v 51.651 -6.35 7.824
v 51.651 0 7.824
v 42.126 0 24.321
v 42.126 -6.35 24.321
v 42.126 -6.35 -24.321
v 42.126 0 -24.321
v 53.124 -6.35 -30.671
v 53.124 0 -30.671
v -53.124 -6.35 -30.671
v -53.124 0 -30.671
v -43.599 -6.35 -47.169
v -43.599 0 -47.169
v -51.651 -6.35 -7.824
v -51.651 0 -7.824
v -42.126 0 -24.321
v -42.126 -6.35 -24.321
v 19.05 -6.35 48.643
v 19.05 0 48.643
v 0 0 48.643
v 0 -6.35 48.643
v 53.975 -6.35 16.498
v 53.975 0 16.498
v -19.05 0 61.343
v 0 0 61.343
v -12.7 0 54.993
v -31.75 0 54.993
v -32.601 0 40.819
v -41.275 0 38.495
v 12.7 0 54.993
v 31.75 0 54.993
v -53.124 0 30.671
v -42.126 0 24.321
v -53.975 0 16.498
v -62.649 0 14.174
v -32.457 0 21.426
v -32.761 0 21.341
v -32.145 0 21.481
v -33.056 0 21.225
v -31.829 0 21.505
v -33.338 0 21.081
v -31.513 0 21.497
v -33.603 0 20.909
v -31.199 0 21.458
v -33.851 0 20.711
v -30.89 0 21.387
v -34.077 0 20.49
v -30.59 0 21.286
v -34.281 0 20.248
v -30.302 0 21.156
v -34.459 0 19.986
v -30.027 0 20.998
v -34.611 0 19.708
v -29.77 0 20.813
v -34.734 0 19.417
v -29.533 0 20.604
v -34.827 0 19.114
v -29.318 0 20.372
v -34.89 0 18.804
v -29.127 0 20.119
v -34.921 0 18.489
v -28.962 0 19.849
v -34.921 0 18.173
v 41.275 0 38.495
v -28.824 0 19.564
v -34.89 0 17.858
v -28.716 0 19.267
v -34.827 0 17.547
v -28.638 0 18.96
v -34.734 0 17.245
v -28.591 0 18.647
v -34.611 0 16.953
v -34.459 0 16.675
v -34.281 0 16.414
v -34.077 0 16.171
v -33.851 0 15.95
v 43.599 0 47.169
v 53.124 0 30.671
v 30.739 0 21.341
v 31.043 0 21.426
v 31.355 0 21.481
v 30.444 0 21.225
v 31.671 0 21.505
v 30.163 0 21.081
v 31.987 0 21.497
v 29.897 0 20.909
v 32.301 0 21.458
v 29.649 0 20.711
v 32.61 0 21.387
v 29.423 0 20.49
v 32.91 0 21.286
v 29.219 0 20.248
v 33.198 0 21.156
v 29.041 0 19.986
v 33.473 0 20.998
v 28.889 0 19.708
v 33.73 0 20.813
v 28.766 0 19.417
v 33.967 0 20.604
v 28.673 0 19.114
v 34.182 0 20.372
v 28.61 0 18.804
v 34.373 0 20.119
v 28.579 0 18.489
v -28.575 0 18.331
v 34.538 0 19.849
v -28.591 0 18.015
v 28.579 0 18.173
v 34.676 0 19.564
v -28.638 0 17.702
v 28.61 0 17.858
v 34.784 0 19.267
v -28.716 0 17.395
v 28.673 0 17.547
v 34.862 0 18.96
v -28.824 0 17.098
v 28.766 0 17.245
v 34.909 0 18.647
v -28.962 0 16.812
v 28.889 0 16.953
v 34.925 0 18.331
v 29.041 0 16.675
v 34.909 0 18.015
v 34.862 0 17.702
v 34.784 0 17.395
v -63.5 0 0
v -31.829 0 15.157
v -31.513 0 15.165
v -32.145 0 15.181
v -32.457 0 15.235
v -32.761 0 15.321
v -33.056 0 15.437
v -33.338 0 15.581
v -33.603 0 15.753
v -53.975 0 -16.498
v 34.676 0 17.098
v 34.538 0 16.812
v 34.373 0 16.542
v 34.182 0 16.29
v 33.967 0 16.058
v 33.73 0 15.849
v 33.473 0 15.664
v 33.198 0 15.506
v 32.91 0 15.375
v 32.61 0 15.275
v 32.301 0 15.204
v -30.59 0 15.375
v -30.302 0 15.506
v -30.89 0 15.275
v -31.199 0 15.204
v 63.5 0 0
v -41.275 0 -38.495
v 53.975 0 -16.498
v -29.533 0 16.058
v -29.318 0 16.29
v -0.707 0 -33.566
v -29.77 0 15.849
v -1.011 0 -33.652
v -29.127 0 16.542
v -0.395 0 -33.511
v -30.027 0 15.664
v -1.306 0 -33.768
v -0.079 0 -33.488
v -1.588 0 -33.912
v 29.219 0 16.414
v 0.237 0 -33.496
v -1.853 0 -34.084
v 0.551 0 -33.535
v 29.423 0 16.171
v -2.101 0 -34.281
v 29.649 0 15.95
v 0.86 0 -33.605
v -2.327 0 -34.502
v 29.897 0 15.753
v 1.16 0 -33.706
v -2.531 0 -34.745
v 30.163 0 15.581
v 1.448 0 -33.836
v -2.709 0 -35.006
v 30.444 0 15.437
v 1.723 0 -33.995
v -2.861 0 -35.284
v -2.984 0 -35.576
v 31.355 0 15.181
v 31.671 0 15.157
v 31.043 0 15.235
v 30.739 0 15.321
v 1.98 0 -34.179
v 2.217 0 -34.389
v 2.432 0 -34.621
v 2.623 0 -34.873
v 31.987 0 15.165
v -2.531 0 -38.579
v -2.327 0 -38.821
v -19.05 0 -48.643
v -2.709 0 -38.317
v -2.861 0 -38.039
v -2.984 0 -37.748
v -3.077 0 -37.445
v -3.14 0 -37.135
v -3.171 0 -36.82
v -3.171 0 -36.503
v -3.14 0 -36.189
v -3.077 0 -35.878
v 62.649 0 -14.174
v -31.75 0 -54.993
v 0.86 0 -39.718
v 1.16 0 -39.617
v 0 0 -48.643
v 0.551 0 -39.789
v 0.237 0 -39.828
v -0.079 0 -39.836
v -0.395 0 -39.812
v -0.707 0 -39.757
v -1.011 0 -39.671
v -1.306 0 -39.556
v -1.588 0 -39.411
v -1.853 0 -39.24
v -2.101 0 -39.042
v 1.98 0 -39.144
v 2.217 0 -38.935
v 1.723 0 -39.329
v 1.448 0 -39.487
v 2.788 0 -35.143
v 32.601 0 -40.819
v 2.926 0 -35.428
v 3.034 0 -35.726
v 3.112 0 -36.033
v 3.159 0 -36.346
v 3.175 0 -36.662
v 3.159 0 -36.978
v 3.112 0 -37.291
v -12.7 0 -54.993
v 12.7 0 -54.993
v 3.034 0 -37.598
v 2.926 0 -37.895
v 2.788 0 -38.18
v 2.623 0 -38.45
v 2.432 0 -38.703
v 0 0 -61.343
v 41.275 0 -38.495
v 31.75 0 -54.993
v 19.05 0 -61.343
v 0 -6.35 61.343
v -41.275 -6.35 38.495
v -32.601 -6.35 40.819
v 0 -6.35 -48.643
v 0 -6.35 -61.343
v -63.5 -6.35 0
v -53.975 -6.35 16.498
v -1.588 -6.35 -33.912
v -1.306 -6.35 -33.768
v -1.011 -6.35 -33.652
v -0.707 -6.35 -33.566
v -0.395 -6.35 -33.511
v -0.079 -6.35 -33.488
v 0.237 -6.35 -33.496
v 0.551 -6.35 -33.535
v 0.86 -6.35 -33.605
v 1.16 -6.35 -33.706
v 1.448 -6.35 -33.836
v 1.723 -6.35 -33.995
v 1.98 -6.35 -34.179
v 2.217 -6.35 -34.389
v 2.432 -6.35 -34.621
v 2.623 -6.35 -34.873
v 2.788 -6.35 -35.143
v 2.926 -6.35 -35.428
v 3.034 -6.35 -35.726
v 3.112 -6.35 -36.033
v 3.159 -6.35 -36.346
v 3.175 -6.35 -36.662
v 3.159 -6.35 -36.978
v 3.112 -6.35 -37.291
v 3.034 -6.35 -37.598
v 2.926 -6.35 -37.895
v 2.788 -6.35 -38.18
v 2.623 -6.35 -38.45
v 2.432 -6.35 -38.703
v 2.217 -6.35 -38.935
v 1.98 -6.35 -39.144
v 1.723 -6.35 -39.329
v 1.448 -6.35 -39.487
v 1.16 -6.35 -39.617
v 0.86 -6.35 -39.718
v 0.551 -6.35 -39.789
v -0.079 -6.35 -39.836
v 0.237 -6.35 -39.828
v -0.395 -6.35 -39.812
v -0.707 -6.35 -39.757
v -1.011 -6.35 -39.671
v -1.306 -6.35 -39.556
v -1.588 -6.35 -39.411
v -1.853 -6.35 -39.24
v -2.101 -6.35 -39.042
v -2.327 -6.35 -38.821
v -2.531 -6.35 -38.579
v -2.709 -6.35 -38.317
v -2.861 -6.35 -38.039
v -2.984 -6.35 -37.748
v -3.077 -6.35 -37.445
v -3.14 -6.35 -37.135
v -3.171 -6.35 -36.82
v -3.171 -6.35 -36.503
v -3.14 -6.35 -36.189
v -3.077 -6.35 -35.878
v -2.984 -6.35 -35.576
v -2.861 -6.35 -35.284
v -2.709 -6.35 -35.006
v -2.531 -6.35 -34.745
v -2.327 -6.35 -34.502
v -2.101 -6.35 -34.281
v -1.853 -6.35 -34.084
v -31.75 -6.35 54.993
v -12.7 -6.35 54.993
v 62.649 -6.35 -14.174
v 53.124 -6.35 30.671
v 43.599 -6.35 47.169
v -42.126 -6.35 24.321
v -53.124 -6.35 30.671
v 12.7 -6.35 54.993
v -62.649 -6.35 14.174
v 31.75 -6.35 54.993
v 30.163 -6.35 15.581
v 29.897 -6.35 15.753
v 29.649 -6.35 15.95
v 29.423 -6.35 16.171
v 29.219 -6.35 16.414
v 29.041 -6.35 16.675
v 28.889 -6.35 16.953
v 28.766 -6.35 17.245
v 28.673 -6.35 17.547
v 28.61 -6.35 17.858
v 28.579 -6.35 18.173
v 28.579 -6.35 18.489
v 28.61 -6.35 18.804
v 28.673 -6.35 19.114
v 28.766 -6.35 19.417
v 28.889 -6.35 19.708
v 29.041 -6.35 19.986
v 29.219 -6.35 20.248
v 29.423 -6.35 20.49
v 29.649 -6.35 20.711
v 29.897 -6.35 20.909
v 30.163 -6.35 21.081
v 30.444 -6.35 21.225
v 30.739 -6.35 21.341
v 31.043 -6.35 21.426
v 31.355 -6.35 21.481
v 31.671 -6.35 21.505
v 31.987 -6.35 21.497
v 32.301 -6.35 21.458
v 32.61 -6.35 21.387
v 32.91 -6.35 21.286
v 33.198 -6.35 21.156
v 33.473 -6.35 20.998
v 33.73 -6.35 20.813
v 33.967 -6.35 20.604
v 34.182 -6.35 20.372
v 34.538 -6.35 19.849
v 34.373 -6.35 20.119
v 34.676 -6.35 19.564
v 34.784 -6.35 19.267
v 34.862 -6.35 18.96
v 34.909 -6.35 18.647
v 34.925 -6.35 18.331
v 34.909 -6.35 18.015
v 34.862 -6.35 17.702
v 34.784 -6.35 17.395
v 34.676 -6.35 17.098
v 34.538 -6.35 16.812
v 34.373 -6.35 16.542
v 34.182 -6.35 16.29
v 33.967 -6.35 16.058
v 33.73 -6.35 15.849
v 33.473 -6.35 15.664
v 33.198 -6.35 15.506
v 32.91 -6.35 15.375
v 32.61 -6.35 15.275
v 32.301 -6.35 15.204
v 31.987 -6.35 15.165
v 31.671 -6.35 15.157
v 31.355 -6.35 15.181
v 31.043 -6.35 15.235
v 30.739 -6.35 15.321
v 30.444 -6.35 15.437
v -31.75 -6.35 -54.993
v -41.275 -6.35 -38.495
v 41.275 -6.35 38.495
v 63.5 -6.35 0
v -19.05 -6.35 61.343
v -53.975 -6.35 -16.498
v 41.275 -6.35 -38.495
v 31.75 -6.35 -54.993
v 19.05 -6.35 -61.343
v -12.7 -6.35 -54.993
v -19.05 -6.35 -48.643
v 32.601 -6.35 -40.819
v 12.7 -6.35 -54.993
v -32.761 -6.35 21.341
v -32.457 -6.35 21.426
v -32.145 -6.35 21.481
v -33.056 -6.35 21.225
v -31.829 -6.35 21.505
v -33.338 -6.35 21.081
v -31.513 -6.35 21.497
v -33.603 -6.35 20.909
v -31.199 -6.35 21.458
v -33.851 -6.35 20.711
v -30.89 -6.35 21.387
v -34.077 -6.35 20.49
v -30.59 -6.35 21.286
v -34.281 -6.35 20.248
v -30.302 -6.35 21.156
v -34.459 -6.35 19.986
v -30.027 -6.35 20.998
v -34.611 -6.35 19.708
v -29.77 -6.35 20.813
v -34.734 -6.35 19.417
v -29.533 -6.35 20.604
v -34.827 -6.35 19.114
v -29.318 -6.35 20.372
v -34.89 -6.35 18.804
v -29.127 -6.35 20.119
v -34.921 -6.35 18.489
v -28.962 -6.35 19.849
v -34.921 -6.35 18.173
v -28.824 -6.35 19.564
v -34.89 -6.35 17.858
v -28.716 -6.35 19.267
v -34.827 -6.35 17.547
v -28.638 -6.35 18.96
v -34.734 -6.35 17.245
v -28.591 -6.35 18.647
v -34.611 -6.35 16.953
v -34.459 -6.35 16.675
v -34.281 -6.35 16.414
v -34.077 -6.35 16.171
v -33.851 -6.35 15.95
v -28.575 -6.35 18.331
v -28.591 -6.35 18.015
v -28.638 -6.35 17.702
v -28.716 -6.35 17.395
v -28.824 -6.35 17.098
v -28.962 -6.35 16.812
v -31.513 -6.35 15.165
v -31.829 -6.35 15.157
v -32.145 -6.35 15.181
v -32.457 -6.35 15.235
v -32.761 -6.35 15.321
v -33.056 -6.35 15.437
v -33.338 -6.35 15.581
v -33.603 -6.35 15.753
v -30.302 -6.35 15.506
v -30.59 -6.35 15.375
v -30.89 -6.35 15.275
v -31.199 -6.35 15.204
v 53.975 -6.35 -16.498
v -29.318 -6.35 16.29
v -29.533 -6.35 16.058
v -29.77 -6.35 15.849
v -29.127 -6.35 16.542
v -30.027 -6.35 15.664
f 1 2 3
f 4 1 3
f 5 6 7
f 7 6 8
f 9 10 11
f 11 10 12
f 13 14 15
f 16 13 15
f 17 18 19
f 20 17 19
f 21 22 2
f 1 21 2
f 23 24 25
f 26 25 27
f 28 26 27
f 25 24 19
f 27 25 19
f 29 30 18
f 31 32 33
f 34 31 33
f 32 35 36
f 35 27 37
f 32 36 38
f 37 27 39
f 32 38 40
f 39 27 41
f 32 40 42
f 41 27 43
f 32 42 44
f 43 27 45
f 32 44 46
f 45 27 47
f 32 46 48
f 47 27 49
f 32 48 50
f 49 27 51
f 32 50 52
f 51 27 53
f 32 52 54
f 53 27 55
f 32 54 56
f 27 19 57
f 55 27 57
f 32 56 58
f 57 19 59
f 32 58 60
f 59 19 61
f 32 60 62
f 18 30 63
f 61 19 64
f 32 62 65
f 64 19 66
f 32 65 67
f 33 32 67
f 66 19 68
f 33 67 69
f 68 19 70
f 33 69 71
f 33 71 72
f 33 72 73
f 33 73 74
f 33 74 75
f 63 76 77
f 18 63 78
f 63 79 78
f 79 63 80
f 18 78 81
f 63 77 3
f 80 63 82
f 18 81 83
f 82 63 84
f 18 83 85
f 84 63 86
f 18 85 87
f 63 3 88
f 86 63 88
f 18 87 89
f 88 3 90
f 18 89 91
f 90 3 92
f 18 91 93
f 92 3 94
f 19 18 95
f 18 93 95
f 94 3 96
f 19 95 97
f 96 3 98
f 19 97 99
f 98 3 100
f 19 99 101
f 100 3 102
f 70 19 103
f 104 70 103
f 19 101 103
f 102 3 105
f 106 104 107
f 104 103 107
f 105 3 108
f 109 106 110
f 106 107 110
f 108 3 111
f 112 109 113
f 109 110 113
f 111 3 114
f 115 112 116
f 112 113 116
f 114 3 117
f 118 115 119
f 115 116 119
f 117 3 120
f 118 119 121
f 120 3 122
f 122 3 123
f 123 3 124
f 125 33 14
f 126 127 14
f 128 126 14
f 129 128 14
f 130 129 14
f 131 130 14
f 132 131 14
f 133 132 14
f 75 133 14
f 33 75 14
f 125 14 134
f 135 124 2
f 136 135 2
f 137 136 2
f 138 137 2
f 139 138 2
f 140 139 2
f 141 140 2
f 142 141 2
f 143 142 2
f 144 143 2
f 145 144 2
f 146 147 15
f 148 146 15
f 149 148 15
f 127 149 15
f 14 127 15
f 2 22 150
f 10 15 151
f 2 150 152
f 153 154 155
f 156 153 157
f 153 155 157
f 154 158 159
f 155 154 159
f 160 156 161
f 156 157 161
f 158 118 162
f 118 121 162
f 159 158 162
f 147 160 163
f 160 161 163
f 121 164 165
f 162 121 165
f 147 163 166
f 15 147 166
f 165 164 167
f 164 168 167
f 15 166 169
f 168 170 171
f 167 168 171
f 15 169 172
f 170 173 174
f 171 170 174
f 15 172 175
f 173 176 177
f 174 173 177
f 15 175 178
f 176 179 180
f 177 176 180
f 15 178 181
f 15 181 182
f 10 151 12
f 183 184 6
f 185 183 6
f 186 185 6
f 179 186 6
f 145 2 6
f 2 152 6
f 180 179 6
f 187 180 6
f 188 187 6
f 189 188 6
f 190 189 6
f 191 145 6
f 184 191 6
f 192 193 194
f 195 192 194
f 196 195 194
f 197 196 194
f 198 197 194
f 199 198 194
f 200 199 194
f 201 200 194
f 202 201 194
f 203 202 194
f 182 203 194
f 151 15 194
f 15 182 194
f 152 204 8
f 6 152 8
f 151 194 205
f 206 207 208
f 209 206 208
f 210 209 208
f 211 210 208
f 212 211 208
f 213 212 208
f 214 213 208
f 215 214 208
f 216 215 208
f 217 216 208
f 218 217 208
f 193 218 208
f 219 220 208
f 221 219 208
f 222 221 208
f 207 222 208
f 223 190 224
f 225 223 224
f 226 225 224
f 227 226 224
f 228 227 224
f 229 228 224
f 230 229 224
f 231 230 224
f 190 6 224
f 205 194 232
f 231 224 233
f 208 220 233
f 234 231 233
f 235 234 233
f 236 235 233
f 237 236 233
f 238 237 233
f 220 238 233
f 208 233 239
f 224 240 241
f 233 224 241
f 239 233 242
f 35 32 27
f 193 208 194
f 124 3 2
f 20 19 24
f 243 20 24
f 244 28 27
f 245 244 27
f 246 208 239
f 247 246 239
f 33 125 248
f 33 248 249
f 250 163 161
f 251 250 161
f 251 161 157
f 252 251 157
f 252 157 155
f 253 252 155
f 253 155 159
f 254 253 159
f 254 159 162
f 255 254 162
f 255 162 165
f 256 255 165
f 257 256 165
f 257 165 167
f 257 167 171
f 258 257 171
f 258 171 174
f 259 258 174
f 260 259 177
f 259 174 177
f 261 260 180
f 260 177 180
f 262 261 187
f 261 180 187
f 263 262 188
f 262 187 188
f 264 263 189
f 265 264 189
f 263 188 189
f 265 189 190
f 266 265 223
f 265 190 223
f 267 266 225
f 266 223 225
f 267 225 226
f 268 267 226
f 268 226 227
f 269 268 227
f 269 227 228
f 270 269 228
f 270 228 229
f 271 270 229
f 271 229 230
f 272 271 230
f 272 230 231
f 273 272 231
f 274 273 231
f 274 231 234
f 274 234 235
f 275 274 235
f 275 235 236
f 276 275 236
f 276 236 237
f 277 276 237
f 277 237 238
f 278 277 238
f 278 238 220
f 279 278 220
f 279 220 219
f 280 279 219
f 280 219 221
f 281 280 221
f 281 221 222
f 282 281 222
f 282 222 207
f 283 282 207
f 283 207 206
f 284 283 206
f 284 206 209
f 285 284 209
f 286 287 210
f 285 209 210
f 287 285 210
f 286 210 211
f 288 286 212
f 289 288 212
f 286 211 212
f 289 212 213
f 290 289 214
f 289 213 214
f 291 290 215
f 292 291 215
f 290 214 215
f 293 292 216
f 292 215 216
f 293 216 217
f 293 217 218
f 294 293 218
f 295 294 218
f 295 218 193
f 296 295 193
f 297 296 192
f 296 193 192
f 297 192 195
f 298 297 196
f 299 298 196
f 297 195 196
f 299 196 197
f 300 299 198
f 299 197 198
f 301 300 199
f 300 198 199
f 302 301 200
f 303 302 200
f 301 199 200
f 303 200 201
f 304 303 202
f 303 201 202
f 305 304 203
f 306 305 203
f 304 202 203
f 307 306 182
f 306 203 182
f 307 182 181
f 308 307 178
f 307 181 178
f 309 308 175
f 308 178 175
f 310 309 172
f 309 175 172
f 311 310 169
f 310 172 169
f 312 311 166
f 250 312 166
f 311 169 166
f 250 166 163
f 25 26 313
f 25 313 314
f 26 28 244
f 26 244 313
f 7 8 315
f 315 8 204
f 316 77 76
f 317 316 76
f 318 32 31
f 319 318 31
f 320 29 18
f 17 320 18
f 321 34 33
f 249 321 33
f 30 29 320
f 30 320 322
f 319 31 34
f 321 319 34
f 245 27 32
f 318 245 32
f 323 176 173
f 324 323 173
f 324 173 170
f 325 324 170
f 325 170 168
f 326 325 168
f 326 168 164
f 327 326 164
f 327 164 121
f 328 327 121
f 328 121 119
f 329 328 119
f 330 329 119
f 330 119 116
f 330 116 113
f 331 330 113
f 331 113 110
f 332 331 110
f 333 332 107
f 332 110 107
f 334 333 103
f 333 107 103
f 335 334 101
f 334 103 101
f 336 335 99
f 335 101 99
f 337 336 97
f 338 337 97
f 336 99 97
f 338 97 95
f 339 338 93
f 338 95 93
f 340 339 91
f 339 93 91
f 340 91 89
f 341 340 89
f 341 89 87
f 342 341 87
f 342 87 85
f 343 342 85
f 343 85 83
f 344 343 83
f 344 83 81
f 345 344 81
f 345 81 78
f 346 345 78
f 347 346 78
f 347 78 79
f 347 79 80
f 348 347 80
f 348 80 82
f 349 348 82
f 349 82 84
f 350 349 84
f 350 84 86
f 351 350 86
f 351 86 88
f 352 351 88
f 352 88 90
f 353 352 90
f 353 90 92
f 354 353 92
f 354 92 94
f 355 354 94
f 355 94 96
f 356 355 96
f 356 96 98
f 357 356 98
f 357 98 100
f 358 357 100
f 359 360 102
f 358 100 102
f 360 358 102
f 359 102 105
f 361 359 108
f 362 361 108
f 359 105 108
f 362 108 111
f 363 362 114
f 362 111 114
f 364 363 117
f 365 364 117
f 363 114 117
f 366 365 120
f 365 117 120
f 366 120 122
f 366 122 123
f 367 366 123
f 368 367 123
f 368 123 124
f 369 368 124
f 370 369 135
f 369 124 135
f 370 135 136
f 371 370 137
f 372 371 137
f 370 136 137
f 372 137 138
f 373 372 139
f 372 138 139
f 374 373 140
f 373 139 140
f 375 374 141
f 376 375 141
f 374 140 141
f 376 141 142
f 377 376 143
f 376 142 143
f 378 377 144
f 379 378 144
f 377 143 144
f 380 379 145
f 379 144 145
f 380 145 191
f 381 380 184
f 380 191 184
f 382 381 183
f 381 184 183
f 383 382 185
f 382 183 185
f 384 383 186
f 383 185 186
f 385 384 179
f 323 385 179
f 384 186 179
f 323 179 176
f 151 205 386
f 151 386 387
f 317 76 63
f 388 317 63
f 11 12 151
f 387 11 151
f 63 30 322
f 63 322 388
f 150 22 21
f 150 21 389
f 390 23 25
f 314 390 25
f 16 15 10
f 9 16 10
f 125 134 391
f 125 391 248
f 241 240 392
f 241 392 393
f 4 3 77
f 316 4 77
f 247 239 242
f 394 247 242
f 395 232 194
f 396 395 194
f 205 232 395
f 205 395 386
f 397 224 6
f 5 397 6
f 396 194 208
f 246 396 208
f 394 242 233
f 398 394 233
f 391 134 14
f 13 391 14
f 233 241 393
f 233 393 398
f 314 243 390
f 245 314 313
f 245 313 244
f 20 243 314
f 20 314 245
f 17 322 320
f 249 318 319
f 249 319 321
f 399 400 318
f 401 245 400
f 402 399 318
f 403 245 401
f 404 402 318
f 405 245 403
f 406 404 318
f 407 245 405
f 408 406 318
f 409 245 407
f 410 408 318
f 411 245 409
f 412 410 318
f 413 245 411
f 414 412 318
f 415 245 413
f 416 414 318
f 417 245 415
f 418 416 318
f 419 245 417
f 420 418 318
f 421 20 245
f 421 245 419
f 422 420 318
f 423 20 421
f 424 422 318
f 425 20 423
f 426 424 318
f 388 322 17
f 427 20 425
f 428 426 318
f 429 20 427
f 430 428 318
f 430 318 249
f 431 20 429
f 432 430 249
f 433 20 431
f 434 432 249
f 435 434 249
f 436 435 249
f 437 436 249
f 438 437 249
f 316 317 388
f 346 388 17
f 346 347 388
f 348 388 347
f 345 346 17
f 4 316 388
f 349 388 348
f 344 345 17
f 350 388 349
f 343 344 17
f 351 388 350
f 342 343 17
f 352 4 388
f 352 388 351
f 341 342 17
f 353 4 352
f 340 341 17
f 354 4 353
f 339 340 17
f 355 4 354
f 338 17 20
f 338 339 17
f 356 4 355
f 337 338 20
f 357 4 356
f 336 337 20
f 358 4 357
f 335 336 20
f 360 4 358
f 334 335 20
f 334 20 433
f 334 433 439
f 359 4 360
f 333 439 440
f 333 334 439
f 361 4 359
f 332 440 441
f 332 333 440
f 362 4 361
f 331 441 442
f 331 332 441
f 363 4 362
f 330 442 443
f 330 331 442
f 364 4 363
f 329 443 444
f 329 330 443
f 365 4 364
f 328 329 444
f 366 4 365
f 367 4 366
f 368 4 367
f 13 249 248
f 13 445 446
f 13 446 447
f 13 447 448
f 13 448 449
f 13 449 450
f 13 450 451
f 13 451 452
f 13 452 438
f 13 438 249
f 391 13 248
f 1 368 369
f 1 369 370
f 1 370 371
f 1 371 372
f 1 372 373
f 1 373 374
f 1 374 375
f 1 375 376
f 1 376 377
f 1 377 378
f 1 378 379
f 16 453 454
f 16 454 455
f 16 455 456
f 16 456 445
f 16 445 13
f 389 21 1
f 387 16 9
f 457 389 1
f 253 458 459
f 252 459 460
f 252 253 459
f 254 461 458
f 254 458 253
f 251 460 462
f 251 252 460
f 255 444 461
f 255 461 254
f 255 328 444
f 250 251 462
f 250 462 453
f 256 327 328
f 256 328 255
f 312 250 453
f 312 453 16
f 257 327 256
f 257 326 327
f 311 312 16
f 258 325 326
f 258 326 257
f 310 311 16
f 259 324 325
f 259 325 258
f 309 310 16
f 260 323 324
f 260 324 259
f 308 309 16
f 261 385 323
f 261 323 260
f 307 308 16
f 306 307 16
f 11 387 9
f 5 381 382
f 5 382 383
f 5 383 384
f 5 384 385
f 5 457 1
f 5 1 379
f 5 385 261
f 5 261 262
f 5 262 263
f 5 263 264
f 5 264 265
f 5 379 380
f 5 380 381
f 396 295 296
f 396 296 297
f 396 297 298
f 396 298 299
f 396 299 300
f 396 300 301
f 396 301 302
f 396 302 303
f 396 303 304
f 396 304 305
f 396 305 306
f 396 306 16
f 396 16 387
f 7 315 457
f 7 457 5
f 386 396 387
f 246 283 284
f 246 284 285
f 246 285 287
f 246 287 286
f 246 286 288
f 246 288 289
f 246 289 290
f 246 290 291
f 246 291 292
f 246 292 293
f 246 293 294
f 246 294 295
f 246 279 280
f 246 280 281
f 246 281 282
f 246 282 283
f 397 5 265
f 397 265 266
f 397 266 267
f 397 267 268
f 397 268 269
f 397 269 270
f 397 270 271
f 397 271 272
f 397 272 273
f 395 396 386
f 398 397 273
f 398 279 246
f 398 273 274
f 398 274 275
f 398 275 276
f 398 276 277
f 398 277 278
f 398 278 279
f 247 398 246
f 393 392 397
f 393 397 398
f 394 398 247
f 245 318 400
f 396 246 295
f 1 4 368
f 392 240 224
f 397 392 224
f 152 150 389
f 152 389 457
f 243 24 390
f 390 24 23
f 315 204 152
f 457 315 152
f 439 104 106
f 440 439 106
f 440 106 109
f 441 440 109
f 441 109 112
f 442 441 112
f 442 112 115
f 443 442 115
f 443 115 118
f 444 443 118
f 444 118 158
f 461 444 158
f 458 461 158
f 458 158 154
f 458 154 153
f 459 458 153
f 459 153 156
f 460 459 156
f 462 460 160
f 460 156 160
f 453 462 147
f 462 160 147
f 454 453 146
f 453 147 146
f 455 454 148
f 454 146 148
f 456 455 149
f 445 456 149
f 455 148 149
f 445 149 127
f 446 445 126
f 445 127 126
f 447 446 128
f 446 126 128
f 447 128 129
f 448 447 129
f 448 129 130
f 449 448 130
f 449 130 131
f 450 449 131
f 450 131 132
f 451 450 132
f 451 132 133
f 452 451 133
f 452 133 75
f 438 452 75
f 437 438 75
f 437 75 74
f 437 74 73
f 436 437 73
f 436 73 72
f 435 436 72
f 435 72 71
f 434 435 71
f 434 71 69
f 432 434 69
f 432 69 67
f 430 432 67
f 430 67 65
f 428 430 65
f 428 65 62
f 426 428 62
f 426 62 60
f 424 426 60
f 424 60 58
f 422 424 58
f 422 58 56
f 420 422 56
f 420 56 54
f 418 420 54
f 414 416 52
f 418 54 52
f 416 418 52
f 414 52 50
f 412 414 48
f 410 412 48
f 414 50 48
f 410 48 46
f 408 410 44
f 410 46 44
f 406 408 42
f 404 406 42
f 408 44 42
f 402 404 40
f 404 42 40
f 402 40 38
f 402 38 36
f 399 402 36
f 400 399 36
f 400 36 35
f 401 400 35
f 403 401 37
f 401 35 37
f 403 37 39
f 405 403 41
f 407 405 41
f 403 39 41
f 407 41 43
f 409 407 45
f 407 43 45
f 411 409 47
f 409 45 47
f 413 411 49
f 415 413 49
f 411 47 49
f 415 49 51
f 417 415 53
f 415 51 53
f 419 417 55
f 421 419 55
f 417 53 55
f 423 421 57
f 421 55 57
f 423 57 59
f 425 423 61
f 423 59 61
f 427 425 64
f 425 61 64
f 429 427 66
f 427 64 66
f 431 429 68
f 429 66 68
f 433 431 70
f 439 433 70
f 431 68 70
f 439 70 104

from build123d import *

# Parameters (mm, degrees)
BOSS_EXTRUDE1_DEPTH = 6.35
SKETCH9_R           = 3.175
CUT_EXTRUDE3_DEPTH  = 85.242269675
CIRPATTERN6_COUNT   = 3
CUT_EXTRUDE4_DEPTH  = 85.242269675
BOSS_EXTRUDE4_DEPTH = 6.35
CIRPATTERN7_COUNT   = 6


with BuildPart() as part:
    # Sketch1 → Boss-Extrude1 (new body)
    with BuildSketch(Plane(origin=(0, 0, 0), x_dir=(1, 0, 0), z_dir=(0, 1, 0))):
        Polygon((63.5, 0), (31.75, 54.99261314), (-31.75, 54.99261314), (-63.5, 0), (-31.75, -54.99261314), (31.75, -54.99261314), align=None)
    extrude(amount=-BOSS_EXTRUDE1_DEPTH)

    # Sketch9 → Cut-Extrude3 (cut, through all)
    with BuildSketch(Plane(origin=(0, 0, 0), x_dir=(1, 0, 0), z_dir=(0, 1, 0))):
        with Locations((-31.75, -18.330871047)):
            Circle(SKETCH9_R)
    cut_extrude3 = extrude(amount=-CUT_EXTRUDE3_DEPTH, mode=Mode.SUBTRACT)

    # CirPattern6: Cut-Extrude3 ×3 about axis
    cirpattern6_axis = Axis((0, 0, 0), (0, 1, 0))
    for i in range(1, CIRPATTERN6_COUNT):
        add(cut_extrude3.rotate(cirpattern6_axis, i * 360 / CIRPATTERN6_COUNT), mode=Mode.SUBTRACT)

    # Sketch10 → Cut-Extrude4 (cut, through all)
    with BuildSketch(Plane(origin=(0, 0, 0), x_dir=(1, 0, 0), z_dir=(0, 1, 0))):
        Polygon((41.275, 38.494829198), (32.600738686, 40.819090512), (42.125738686, 24.32130657), (47.625, 27.49630657), align=None)
    cut_extrude4 = extrude(amount=-CUT_EXTRUDE4_DEPTH, mode=Mode.SUBTRACT)

    # Sketch11 → Boss-Extrude4 (add)
    with BuildSketch(Plane(origin=(0, 0, 0), x_dir=(1, 0, 0), z_dir=(0, 1, 0))):
        Polygon((47.625, 27.49630657), (53.124261314, 30.67130657), (62.649261314, 14.173522628), (53.975, 16.497783942), align=None)
    boss_extrude4 = extrude(amount=-BOSS_EXTRUDE4_DEPTH)

    # CirPattern7: Cut-Extrude4, Boss-Extrude4 ×6 about axis
    cirpattern7_axis = Axis((0, 0, 0), (0, 1, 0))
    add([cut_extrude4.rotate(cirpattern7_axis, i * 360 / CIRPATTERN7_COUNT) for i in range(1, CIRPATTERN7_COUNT)], mode=Mode.SUBTRACT)
    add([boss_extrude4.rotate(cirpattern7_axis, i * 360 / CIRPATTERN7_COUNT) for i in range(1, CIRPATTERN7_COUNT)])


solid = part.part
